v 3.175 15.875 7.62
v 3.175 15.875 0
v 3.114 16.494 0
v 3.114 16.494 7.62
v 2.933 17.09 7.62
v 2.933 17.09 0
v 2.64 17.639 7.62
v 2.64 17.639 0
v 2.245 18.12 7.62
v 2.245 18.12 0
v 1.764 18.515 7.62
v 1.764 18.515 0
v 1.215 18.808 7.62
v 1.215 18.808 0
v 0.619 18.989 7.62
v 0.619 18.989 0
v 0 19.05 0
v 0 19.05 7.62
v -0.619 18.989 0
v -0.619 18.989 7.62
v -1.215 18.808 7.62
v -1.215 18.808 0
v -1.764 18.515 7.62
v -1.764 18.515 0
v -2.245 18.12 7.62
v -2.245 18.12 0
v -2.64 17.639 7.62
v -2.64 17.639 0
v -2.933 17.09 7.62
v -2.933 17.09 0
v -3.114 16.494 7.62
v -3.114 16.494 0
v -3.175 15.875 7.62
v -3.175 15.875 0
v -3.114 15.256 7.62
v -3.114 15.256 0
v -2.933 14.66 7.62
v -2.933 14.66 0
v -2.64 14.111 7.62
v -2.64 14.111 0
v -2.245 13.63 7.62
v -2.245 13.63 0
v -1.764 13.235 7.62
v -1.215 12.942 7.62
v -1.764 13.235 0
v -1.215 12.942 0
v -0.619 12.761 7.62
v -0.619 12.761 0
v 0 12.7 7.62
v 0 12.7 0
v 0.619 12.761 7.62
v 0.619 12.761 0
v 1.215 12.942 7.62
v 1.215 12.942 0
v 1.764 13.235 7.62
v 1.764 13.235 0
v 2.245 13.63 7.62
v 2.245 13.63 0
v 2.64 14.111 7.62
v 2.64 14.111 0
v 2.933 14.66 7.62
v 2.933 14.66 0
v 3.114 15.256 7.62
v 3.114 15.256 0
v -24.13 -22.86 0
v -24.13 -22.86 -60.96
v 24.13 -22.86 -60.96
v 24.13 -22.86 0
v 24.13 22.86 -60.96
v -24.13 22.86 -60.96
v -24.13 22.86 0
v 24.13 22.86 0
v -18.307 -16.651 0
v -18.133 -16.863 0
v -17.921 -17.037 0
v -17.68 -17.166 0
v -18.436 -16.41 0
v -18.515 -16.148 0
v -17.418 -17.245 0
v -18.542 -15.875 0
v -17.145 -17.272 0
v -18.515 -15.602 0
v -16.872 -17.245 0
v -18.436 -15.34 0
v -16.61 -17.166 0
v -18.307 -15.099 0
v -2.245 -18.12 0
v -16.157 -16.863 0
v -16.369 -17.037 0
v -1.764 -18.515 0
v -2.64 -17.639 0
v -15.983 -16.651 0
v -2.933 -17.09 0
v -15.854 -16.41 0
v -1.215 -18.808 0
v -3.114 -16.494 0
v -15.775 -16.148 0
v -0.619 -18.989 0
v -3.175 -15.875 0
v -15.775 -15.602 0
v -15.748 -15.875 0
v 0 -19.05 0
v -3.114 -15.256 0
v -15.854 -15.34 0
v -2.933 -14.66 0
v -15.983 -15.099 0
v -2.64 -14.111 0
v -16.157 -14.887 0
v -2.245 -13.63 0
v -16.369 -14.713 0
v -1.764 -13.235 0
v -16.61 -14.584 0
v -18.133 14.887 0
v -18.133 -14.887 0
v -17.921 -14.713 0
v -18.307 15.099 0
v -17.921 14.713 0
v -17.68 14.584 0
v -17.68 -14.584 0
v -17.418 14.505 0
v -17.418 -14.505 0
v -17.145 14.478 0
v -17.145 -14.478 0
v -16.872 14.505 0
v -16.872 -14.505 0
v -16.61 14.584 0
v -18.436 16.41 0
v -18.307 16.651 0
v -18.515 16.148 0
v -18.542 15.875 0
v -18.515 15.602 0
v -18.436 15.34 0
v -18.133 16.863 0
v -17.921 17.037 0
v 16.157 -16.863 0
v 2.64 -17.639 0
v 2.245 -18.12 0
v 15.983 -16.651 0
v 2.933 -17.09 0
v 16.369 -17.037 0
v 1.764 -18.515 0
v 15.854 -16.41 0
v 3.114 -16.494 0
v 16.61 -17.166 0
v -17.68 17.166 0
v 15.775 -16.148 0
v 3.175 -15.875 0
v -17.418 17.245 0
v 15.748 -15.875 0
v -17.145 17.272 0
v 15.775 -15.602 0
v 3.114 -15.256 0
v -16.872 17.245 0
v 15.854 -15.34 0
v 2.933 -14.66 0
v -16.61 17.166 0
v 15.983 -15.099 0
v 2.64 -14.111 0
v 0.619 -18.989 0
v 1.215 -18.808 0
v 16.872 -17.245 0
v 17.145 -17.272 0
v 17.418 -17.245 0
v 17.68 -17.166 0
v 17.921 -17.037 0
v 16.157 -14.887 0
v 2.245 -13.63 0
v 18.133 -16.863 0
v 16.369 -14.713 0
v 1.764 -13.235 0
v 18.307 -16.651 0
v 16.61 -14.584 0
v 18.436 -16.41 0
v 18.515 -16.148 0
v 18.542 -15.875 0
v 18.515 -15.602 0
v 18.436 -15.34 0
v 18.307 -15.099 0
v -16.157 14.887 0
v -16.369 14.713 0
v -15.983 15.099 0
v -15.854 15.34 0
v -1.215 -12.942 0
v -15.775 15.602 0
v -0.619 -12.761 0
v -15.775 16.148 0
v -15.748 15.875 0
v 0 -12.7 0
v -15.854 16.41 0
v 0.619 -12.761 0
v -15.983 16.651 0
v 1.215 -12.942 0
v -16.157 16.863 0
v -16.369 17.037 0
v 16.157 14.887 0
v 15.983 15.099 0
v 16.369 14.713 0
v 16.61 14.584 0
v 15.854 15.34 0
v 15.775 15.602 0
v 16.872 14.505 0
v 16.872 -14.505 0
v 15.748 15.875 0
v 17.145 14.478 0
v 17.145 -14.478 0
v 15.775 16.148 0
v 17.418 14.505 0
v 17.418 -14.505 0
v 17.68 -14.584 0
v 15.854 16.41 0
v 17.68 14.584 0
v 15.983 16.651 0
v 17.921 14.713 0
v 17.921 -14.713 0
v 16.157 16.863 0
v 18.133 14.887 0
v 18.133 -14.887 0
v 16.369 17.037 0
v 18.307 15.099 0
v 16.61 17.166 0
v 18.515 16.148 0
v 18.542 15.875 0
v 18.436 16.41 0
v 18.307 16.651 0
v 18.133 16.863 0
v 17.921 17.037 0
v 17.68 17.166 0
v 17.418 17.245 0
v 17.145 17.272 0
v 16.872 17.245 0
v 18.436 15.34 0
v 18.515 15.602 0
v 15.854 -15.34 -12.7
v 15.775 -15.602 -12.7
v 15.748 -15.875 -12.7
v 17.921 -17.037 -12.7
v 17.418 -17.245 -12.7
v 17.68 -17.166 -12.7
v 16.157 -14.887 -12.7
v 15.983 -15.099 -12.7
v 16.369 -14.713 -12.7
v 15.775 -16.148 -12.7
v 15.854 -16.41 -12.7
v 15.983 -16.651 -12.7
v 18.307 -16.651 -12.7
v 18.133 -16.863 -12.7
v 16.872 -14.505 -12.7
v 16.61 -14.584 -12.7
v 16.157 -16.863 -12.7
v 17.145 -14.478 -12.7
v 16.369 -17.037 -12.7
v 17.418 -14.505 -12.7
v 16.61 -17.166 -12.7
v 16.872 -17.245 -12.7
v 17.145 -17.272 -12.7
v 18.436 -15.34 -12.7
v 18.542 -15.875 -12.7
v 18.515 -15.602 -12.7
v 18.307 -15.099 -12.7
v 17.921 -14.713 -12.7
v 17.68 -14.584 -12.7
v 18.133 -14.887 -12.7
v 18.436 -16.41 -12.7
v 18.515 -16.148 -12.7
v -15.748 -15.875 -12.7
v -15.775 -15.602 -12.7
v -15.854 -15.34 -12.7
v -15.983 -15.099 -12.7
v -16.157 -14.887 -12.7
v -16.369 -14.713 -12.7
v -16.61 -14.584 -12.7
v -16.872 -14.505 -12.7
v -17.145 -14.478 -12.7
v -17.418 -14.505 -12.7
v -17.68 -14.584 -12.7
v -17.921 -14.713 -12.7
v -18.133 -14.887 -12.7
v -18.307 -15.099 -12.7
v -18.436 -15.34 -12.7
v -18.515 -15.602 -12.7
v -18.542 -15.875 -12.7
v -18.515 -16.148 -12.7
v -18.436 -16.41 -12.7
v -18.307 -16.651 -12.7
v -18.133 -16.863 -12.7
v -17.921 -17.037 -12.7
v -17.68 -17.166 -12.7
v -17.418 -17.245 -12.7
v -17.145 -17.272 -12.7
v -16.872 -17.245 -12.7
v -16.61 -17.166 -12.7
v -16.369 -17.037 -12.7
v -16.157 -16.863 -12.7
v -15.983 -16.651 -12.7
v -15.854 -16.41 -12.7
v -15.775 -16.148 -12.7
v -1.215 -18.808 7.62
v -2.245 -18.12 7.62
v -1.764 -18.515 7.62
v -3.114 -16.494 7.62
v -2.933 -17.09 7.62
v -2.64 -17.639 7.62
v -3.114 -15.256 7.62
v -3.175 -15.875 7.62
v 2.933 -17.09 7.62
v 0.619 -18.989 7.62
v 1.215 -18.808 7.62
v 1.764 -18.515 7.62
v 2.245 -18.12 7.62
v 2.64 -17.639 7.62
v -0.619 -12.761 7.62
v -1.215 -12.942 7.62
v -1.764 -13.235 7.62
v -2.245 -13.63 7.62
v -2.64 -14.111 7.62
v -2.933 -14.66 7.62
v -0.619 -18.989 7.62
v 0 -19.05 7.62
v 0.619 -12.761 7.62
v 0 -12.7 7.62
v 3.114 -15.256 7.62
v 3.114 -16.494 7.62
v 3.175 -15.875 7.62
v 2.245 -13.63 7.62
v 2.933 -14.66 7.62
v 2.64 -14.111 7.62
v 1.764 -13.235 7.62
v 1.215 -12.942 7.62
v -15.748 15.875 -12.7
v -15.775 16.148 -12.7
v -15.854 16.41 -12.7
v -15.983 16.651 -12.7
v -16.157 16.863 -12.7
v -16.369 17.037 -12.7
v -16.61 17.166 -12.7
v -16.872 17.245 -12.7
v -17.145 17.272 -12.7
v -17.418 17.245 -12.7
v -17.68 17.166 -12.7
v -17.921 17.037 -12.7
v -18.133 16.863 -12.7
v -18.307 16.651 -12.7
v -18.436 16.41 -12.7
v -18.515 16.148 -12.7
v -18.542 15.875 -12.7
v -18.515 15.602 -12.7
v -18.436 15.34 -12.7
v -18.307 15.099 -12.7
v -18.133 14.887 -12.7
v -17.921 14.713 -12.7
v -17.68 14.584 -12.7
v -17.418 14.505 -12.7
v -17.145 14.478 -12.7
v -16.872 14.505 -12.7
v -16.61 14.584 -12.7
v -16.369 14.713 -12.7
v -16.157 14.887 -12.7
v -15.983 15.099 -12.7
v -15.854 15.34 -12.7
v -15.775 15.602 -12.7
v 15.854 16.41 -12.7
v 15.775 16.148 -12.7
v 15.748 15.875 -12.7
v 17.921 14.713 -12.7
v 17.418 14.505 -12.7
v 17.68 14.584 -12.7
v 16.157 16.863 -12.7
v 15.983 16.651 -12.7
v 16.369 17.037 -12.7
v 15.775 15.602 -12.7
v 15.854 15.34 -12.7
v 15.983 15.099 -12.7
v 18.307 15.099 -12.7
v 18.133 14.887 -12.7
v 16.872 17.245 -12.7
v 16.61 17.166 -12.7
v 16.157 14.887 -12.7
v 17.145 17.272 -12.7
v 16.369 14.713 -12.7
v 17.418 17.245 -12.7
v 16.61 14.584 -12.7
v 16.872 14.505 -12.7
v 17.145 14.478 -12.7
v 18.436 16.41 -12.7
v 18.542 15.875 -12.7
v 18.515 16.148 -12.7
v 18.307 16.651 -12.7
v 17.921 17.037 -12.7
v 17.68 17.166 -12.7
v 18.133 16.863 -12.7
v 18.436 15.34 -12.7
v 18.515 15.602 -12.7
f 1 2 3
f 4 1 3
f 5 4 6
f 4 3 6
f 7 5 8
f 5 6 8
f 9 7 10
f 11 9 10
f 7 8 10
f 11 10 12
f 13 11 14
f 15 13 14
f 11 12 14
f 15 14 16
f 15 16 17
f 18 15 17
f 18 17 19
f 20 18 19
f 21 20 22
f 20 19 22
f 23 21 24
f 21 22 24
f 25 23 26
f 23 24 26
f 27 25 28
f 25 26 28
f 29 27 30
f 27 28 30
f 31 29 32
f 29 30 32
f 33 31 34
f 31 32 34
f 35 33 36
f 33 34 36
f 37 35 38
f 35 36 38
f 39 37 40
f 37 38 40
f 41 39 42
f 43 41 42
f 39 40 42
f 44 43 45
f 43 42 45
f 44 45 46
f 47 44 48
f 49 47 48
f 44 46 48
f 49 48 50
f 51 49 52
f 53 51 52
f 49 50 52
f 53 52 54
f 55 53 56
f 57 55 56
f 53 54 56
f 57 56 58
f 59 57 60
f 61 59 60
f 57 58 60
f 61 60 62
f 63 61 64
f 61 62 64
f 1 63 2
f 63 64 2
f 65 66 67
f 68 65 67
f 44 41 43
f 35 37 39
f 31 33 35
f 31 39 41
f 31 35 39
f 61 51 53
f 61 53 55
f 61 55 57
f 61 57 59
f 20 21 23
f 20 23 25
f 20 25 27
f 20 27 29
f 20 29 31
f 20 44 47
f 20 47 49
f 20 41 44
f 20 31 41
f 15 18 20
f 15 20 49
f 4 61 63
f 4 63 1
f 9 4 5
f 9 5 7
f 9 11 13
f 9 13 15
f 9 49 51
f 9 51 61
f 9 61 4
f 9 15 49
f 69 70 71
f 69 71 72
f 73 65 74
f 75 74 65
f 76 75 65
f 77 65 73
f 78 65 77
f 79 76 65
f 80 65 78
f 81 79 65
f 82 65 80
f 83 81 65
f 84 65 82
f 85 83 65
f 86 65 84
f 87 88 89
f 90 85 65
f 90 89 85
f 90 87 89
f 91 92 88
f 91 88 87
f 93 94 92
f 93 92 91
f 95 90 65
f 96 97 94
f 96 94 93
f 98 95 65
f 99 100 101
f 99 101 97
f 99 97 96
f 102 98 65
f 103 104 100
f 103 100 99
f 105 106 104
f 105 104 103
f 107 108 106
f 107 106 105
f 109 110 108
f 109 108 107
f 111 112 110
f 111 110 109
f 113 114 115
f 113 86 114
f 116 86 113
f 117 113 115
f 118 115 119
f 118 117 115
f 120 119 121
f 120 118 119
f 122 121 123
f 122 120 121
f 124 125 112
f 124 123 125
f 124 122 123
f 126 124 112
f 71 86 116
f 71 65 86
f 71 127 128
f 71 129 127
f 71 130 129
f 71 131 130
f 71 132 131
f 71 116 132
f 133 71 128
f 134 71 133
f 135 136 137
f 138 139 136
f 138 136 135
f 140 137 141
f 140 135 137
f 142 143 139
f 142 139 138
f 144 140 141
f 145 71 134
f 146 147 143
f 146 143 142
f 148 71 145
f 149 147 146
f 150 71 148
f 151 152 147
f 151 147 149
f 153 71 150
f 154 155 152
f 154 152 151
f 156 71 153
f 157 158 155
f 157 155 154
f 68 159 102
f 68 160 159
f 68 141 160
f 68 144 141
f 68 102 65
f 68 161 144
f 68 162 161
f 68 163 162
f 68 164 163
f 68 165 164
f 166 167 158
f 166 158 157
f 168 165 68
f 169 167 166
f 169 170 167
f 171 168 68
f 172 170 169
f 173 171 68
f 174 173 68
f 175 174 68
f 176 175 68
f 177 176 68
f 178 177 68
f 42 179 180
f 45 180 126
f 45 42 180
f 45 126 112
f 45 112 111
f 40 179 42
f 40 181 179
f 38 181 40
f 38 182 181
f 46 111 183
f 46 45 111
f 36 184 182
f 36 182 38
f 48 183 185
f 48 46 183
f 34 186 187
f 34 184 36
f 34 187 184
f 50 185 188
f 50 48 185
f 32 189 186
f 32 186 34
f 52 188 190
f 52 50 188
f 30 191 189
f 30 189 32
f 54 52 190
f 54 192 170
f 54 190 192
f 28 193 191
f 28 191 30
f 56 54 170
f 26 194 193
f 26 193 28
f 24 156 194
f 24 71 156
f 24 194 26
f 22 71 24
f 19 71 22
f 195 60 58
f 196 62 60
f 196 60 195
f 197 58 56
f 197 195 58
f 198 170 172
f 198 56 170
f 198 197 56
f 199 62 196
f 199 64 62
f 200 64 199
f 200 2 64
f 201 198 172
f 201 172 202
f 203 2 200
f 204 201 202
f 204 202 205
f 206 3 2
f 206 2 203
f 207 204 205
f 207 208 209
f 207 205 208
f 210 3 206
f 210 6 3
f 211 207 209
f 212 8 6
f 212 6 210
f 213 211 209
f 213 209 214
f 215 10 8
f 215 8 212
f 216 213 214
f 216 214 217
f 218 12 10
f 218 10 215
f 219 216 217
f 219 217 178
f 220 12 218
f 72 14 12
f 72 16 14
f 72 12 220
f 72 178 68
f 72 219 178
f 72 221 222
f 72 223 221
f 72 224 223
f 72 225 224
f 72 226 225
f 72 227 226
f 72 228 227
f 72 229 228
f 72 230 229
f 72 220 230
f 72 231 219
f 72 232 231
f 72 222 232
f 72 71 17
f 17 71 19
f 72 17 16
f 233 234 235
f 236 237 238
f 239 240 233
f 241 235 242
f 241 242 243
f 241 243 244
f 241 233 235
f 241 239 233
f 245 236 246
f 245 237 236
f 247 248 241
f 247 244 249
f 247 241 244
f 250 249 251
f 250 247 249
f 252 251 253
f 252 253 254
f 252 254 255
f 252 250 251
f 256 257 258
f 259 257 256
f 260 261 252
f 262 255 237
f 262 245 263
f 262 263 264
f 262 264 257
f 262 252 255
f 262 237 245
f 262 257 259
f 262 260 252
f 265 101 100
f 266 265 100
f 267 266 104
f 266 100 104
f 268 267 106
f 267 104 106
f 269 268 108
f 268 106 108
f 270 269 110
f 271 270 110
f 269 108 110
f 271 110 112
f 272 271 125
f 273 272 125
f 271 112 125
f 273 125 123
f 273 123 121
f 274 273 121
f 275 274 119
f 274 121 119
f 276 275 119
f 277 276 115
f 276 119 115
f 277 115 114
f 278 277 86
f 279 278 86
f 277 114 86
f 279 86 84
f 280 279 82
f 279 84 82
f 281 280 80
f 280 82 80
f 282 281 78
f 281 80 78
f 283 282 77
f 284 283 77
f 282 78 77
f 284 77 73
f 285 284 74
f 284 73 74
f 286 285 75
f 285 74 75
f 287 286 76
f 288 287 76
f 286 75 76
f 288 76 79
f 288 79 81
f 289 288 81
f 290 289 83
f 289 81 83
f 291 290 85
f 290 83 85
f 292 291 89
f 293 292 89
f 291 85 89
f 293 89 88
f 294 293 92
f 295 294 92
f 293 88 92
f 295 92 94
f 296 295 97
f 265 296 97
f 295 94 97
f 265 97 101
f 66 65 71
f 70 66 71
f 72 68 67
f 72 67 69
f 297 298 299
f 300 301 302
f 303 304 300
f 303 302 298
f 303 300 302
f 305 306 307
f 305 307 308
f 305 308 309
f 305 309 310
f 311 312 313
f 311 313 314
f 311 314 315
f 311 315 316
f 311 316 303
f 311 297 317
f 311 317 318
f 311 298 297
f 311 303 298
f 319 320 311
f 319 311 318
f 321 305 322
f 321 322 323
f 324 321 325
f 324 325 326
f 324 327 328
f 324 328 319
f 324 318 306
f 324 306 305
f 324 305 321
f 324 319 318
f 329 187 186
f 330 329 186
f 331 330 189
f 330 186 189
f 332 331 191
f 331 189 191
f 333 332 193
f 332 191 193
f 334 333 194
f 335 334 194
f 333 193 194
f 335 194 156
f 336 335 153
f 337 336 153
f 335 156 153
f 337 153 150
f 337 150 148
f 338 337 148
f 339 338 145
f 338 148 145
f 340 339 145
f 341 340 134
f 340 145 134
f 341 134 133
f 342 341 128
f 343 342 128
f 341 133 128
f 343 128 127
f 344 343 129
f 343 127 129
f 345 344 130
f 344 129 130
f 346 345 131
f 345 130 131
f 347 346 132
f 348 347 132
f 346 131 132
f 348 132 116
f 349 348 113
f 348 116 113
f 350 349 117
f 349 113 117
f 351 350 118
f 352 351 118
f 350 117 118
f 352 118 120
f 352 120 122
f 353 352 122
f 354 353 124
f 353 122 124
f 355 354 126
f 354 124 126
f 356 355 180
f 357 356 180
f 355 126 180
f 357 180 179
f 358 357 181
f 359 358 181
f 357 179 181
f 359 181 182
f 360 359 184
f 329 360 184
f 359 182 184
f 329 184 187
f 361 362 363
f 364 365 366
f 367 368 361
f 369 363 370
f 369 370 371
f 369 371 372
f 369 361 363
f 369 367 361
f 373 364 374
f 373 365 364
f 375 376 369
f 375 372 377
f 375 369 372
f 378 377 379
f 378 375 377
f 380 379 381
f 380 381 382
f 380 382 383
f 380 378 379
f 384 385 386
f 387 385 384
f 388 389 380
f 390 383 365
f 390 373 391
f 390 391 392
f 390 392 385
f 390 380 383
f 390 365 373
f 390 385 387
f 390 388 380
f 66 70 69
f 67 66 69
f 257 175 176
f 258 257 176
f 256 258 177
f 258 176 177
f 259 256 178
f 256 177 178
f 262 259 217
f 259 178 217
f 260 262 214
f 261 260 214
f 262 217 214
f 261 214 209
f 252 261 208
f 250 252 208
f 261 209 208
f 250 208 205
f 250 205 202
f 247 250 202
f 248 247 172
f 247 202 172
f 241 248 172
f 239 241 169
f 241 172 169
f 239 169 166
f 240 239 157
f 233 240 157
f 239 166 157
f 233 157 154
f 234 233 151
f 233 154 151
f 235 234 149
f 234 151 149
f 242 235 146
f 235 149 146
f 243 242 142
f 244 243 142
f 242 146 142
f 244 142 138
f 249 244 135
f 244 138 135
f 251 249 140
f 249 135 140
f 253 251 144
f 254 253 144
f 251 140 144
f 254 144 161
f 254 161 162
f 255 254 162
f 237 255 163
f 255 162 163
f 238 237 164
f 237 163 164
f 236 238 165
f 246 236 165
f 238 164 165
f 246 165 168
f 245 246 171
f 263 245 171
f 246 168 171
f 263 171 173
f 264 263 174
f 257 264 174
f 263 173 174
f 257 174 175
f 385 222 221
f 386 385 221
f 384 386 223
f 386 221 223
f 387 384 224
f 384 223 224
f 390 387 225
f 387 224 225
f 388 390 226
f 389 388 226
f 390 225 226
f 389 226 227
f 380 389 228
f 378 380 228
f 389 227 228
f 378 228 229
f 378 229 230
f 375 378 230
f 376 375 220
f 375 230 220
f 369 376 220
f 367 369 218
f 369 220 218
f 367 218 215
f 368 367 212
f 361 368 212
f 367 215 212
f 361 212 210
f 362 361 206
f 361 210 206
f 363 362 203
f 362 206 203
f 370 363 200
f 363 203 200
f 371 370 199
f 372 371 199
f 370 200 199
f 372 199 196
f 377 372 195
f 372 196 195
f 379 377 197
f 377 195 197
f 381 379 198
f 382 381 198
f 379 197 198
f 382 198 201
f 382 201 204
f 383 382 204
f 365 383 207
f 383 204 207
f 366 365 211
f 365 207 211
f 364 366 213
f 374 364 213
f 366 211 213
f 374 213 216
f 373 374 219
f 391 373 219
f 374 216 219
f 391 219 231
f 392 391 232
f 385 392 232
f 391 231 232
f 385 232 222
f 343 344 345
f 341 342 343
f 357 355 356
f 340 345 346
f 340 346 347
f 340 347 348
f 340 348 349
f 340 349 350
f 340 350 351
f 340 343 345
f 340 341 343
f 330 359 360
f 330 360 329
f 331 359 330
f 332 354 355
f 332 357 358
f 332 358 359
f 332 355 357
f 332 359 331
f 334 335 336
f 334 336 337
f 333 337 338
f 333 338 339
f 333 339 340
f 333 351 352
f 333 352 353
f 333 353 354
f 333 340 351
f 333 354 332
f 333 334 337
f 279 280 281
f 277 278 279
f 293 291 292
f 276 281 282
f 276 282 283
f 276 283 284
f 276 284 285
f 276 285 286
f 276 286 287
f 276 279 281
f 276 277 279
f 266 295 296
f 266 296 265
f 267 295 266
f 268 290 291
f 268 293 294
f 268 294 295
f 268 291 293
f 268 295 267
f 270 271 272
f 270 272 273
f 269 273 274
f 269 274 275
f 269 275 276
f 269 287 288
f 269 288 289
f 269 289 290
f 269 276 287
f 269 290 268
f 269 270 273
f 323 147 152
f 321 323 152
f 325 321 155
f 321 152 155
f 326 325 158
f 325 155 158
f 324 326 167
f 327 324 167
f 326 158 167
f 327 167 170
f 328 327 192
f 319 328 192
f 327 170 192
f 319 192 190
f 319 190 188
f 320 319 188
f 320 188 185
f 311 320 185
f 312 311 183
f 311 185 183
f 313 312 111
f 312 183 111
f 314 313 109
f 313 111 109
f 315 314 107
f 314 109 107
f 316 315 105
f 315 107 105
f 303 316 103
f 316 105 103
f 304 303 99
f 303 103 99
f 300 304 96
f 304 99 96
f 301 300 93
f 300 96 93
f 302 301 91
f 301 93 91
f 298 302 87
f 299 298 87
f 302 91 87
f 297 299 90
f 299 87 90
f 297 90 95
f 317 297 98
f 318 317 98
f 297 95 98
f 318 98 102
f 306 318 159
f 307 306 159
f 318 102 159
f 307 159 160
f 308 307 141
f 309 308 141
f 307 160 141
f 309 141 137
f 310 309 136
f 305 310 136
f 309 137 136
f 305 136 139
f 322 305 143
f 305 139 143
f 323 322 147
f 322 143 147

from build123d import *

# Parameters (mm, degrees)
F0_W     = 48.26
F0_H     = 45.72
F0_R     = 1.397
F0_R_2   = 3.175
F1_DEPTH = 60.96
F2_DEPTH = 12.7
F3_DEPTH = 7.62


with BuildPart() as f1:
    # F0 (on Top) → F1 (new body)
    with BuildSketch(Plane.XY):
        Rectangle(F0_W, F0_H)
        with Locations((-17.145, -15.875)):
            Circle(F0_R, mode=Mode.SUBTRACT)
        with Locations((0, -15.875)):
            Circle(F0_R_2, mode=Mode.SUBTRACT)
        with Locations((17.145, -15.875)):
            Circle(F0_R, mode=Mode.SUBTRACT)
        with Locations((-17.145, 15.875)):
            Circle(F0_R, mode=Mode.SUBTRACT)
        with Locations((0, 15.875)):
            Circle(F0_R_2, mode=Mode.SUBTRACT)
        with Locations((17.145, 15.875)):
            Circle(F0_R, mode=Mode.SUBTRACT)
        with Locations((0, 15.875)):
            Circle(F0_R_2)
        with Locations((0, -15.875)):
            Circle(F0_R_2)
        with Locations((-17.145, 15.875)):
            Circle(F0_R)
        with Locations((-17.145, -15.875)):
            Circle(F0_R)
        with Locations((17.145, 15.875)):
            Circle(F0_R)
        with Locations((17.145, -15.875)):
            Circle(F0_R)
    extrude(amount=-F1_DEPTH)

    # F0 (on Top) → F2 (cut)
    with BuildSketch(Plane.XY):
        with Locations((-17.145, 15.875)):
            Circle(F0_R)
        with Locations((-17.145, -15.875)):
            Circle(F0_R)
        with Locations((17.145, 15.875)):
            Circle(F0_R)
        with Locations((17.145, -15.875)):
            Circle(F0_R)
    extrude(amount=-F2_DEPTH, mode=Mode.SUBTRACT)

    # F0 (on Top) → F3 (join)
    with BuildSketch(Plane.XY):
        with Locations((0, 15.875)):
            Circle(F0_R_2)
        with Locations((0, -15.875)):
            Circle(F0_R_2)
    extrude(amount=F3_DEPTH)


solid = f1.part
